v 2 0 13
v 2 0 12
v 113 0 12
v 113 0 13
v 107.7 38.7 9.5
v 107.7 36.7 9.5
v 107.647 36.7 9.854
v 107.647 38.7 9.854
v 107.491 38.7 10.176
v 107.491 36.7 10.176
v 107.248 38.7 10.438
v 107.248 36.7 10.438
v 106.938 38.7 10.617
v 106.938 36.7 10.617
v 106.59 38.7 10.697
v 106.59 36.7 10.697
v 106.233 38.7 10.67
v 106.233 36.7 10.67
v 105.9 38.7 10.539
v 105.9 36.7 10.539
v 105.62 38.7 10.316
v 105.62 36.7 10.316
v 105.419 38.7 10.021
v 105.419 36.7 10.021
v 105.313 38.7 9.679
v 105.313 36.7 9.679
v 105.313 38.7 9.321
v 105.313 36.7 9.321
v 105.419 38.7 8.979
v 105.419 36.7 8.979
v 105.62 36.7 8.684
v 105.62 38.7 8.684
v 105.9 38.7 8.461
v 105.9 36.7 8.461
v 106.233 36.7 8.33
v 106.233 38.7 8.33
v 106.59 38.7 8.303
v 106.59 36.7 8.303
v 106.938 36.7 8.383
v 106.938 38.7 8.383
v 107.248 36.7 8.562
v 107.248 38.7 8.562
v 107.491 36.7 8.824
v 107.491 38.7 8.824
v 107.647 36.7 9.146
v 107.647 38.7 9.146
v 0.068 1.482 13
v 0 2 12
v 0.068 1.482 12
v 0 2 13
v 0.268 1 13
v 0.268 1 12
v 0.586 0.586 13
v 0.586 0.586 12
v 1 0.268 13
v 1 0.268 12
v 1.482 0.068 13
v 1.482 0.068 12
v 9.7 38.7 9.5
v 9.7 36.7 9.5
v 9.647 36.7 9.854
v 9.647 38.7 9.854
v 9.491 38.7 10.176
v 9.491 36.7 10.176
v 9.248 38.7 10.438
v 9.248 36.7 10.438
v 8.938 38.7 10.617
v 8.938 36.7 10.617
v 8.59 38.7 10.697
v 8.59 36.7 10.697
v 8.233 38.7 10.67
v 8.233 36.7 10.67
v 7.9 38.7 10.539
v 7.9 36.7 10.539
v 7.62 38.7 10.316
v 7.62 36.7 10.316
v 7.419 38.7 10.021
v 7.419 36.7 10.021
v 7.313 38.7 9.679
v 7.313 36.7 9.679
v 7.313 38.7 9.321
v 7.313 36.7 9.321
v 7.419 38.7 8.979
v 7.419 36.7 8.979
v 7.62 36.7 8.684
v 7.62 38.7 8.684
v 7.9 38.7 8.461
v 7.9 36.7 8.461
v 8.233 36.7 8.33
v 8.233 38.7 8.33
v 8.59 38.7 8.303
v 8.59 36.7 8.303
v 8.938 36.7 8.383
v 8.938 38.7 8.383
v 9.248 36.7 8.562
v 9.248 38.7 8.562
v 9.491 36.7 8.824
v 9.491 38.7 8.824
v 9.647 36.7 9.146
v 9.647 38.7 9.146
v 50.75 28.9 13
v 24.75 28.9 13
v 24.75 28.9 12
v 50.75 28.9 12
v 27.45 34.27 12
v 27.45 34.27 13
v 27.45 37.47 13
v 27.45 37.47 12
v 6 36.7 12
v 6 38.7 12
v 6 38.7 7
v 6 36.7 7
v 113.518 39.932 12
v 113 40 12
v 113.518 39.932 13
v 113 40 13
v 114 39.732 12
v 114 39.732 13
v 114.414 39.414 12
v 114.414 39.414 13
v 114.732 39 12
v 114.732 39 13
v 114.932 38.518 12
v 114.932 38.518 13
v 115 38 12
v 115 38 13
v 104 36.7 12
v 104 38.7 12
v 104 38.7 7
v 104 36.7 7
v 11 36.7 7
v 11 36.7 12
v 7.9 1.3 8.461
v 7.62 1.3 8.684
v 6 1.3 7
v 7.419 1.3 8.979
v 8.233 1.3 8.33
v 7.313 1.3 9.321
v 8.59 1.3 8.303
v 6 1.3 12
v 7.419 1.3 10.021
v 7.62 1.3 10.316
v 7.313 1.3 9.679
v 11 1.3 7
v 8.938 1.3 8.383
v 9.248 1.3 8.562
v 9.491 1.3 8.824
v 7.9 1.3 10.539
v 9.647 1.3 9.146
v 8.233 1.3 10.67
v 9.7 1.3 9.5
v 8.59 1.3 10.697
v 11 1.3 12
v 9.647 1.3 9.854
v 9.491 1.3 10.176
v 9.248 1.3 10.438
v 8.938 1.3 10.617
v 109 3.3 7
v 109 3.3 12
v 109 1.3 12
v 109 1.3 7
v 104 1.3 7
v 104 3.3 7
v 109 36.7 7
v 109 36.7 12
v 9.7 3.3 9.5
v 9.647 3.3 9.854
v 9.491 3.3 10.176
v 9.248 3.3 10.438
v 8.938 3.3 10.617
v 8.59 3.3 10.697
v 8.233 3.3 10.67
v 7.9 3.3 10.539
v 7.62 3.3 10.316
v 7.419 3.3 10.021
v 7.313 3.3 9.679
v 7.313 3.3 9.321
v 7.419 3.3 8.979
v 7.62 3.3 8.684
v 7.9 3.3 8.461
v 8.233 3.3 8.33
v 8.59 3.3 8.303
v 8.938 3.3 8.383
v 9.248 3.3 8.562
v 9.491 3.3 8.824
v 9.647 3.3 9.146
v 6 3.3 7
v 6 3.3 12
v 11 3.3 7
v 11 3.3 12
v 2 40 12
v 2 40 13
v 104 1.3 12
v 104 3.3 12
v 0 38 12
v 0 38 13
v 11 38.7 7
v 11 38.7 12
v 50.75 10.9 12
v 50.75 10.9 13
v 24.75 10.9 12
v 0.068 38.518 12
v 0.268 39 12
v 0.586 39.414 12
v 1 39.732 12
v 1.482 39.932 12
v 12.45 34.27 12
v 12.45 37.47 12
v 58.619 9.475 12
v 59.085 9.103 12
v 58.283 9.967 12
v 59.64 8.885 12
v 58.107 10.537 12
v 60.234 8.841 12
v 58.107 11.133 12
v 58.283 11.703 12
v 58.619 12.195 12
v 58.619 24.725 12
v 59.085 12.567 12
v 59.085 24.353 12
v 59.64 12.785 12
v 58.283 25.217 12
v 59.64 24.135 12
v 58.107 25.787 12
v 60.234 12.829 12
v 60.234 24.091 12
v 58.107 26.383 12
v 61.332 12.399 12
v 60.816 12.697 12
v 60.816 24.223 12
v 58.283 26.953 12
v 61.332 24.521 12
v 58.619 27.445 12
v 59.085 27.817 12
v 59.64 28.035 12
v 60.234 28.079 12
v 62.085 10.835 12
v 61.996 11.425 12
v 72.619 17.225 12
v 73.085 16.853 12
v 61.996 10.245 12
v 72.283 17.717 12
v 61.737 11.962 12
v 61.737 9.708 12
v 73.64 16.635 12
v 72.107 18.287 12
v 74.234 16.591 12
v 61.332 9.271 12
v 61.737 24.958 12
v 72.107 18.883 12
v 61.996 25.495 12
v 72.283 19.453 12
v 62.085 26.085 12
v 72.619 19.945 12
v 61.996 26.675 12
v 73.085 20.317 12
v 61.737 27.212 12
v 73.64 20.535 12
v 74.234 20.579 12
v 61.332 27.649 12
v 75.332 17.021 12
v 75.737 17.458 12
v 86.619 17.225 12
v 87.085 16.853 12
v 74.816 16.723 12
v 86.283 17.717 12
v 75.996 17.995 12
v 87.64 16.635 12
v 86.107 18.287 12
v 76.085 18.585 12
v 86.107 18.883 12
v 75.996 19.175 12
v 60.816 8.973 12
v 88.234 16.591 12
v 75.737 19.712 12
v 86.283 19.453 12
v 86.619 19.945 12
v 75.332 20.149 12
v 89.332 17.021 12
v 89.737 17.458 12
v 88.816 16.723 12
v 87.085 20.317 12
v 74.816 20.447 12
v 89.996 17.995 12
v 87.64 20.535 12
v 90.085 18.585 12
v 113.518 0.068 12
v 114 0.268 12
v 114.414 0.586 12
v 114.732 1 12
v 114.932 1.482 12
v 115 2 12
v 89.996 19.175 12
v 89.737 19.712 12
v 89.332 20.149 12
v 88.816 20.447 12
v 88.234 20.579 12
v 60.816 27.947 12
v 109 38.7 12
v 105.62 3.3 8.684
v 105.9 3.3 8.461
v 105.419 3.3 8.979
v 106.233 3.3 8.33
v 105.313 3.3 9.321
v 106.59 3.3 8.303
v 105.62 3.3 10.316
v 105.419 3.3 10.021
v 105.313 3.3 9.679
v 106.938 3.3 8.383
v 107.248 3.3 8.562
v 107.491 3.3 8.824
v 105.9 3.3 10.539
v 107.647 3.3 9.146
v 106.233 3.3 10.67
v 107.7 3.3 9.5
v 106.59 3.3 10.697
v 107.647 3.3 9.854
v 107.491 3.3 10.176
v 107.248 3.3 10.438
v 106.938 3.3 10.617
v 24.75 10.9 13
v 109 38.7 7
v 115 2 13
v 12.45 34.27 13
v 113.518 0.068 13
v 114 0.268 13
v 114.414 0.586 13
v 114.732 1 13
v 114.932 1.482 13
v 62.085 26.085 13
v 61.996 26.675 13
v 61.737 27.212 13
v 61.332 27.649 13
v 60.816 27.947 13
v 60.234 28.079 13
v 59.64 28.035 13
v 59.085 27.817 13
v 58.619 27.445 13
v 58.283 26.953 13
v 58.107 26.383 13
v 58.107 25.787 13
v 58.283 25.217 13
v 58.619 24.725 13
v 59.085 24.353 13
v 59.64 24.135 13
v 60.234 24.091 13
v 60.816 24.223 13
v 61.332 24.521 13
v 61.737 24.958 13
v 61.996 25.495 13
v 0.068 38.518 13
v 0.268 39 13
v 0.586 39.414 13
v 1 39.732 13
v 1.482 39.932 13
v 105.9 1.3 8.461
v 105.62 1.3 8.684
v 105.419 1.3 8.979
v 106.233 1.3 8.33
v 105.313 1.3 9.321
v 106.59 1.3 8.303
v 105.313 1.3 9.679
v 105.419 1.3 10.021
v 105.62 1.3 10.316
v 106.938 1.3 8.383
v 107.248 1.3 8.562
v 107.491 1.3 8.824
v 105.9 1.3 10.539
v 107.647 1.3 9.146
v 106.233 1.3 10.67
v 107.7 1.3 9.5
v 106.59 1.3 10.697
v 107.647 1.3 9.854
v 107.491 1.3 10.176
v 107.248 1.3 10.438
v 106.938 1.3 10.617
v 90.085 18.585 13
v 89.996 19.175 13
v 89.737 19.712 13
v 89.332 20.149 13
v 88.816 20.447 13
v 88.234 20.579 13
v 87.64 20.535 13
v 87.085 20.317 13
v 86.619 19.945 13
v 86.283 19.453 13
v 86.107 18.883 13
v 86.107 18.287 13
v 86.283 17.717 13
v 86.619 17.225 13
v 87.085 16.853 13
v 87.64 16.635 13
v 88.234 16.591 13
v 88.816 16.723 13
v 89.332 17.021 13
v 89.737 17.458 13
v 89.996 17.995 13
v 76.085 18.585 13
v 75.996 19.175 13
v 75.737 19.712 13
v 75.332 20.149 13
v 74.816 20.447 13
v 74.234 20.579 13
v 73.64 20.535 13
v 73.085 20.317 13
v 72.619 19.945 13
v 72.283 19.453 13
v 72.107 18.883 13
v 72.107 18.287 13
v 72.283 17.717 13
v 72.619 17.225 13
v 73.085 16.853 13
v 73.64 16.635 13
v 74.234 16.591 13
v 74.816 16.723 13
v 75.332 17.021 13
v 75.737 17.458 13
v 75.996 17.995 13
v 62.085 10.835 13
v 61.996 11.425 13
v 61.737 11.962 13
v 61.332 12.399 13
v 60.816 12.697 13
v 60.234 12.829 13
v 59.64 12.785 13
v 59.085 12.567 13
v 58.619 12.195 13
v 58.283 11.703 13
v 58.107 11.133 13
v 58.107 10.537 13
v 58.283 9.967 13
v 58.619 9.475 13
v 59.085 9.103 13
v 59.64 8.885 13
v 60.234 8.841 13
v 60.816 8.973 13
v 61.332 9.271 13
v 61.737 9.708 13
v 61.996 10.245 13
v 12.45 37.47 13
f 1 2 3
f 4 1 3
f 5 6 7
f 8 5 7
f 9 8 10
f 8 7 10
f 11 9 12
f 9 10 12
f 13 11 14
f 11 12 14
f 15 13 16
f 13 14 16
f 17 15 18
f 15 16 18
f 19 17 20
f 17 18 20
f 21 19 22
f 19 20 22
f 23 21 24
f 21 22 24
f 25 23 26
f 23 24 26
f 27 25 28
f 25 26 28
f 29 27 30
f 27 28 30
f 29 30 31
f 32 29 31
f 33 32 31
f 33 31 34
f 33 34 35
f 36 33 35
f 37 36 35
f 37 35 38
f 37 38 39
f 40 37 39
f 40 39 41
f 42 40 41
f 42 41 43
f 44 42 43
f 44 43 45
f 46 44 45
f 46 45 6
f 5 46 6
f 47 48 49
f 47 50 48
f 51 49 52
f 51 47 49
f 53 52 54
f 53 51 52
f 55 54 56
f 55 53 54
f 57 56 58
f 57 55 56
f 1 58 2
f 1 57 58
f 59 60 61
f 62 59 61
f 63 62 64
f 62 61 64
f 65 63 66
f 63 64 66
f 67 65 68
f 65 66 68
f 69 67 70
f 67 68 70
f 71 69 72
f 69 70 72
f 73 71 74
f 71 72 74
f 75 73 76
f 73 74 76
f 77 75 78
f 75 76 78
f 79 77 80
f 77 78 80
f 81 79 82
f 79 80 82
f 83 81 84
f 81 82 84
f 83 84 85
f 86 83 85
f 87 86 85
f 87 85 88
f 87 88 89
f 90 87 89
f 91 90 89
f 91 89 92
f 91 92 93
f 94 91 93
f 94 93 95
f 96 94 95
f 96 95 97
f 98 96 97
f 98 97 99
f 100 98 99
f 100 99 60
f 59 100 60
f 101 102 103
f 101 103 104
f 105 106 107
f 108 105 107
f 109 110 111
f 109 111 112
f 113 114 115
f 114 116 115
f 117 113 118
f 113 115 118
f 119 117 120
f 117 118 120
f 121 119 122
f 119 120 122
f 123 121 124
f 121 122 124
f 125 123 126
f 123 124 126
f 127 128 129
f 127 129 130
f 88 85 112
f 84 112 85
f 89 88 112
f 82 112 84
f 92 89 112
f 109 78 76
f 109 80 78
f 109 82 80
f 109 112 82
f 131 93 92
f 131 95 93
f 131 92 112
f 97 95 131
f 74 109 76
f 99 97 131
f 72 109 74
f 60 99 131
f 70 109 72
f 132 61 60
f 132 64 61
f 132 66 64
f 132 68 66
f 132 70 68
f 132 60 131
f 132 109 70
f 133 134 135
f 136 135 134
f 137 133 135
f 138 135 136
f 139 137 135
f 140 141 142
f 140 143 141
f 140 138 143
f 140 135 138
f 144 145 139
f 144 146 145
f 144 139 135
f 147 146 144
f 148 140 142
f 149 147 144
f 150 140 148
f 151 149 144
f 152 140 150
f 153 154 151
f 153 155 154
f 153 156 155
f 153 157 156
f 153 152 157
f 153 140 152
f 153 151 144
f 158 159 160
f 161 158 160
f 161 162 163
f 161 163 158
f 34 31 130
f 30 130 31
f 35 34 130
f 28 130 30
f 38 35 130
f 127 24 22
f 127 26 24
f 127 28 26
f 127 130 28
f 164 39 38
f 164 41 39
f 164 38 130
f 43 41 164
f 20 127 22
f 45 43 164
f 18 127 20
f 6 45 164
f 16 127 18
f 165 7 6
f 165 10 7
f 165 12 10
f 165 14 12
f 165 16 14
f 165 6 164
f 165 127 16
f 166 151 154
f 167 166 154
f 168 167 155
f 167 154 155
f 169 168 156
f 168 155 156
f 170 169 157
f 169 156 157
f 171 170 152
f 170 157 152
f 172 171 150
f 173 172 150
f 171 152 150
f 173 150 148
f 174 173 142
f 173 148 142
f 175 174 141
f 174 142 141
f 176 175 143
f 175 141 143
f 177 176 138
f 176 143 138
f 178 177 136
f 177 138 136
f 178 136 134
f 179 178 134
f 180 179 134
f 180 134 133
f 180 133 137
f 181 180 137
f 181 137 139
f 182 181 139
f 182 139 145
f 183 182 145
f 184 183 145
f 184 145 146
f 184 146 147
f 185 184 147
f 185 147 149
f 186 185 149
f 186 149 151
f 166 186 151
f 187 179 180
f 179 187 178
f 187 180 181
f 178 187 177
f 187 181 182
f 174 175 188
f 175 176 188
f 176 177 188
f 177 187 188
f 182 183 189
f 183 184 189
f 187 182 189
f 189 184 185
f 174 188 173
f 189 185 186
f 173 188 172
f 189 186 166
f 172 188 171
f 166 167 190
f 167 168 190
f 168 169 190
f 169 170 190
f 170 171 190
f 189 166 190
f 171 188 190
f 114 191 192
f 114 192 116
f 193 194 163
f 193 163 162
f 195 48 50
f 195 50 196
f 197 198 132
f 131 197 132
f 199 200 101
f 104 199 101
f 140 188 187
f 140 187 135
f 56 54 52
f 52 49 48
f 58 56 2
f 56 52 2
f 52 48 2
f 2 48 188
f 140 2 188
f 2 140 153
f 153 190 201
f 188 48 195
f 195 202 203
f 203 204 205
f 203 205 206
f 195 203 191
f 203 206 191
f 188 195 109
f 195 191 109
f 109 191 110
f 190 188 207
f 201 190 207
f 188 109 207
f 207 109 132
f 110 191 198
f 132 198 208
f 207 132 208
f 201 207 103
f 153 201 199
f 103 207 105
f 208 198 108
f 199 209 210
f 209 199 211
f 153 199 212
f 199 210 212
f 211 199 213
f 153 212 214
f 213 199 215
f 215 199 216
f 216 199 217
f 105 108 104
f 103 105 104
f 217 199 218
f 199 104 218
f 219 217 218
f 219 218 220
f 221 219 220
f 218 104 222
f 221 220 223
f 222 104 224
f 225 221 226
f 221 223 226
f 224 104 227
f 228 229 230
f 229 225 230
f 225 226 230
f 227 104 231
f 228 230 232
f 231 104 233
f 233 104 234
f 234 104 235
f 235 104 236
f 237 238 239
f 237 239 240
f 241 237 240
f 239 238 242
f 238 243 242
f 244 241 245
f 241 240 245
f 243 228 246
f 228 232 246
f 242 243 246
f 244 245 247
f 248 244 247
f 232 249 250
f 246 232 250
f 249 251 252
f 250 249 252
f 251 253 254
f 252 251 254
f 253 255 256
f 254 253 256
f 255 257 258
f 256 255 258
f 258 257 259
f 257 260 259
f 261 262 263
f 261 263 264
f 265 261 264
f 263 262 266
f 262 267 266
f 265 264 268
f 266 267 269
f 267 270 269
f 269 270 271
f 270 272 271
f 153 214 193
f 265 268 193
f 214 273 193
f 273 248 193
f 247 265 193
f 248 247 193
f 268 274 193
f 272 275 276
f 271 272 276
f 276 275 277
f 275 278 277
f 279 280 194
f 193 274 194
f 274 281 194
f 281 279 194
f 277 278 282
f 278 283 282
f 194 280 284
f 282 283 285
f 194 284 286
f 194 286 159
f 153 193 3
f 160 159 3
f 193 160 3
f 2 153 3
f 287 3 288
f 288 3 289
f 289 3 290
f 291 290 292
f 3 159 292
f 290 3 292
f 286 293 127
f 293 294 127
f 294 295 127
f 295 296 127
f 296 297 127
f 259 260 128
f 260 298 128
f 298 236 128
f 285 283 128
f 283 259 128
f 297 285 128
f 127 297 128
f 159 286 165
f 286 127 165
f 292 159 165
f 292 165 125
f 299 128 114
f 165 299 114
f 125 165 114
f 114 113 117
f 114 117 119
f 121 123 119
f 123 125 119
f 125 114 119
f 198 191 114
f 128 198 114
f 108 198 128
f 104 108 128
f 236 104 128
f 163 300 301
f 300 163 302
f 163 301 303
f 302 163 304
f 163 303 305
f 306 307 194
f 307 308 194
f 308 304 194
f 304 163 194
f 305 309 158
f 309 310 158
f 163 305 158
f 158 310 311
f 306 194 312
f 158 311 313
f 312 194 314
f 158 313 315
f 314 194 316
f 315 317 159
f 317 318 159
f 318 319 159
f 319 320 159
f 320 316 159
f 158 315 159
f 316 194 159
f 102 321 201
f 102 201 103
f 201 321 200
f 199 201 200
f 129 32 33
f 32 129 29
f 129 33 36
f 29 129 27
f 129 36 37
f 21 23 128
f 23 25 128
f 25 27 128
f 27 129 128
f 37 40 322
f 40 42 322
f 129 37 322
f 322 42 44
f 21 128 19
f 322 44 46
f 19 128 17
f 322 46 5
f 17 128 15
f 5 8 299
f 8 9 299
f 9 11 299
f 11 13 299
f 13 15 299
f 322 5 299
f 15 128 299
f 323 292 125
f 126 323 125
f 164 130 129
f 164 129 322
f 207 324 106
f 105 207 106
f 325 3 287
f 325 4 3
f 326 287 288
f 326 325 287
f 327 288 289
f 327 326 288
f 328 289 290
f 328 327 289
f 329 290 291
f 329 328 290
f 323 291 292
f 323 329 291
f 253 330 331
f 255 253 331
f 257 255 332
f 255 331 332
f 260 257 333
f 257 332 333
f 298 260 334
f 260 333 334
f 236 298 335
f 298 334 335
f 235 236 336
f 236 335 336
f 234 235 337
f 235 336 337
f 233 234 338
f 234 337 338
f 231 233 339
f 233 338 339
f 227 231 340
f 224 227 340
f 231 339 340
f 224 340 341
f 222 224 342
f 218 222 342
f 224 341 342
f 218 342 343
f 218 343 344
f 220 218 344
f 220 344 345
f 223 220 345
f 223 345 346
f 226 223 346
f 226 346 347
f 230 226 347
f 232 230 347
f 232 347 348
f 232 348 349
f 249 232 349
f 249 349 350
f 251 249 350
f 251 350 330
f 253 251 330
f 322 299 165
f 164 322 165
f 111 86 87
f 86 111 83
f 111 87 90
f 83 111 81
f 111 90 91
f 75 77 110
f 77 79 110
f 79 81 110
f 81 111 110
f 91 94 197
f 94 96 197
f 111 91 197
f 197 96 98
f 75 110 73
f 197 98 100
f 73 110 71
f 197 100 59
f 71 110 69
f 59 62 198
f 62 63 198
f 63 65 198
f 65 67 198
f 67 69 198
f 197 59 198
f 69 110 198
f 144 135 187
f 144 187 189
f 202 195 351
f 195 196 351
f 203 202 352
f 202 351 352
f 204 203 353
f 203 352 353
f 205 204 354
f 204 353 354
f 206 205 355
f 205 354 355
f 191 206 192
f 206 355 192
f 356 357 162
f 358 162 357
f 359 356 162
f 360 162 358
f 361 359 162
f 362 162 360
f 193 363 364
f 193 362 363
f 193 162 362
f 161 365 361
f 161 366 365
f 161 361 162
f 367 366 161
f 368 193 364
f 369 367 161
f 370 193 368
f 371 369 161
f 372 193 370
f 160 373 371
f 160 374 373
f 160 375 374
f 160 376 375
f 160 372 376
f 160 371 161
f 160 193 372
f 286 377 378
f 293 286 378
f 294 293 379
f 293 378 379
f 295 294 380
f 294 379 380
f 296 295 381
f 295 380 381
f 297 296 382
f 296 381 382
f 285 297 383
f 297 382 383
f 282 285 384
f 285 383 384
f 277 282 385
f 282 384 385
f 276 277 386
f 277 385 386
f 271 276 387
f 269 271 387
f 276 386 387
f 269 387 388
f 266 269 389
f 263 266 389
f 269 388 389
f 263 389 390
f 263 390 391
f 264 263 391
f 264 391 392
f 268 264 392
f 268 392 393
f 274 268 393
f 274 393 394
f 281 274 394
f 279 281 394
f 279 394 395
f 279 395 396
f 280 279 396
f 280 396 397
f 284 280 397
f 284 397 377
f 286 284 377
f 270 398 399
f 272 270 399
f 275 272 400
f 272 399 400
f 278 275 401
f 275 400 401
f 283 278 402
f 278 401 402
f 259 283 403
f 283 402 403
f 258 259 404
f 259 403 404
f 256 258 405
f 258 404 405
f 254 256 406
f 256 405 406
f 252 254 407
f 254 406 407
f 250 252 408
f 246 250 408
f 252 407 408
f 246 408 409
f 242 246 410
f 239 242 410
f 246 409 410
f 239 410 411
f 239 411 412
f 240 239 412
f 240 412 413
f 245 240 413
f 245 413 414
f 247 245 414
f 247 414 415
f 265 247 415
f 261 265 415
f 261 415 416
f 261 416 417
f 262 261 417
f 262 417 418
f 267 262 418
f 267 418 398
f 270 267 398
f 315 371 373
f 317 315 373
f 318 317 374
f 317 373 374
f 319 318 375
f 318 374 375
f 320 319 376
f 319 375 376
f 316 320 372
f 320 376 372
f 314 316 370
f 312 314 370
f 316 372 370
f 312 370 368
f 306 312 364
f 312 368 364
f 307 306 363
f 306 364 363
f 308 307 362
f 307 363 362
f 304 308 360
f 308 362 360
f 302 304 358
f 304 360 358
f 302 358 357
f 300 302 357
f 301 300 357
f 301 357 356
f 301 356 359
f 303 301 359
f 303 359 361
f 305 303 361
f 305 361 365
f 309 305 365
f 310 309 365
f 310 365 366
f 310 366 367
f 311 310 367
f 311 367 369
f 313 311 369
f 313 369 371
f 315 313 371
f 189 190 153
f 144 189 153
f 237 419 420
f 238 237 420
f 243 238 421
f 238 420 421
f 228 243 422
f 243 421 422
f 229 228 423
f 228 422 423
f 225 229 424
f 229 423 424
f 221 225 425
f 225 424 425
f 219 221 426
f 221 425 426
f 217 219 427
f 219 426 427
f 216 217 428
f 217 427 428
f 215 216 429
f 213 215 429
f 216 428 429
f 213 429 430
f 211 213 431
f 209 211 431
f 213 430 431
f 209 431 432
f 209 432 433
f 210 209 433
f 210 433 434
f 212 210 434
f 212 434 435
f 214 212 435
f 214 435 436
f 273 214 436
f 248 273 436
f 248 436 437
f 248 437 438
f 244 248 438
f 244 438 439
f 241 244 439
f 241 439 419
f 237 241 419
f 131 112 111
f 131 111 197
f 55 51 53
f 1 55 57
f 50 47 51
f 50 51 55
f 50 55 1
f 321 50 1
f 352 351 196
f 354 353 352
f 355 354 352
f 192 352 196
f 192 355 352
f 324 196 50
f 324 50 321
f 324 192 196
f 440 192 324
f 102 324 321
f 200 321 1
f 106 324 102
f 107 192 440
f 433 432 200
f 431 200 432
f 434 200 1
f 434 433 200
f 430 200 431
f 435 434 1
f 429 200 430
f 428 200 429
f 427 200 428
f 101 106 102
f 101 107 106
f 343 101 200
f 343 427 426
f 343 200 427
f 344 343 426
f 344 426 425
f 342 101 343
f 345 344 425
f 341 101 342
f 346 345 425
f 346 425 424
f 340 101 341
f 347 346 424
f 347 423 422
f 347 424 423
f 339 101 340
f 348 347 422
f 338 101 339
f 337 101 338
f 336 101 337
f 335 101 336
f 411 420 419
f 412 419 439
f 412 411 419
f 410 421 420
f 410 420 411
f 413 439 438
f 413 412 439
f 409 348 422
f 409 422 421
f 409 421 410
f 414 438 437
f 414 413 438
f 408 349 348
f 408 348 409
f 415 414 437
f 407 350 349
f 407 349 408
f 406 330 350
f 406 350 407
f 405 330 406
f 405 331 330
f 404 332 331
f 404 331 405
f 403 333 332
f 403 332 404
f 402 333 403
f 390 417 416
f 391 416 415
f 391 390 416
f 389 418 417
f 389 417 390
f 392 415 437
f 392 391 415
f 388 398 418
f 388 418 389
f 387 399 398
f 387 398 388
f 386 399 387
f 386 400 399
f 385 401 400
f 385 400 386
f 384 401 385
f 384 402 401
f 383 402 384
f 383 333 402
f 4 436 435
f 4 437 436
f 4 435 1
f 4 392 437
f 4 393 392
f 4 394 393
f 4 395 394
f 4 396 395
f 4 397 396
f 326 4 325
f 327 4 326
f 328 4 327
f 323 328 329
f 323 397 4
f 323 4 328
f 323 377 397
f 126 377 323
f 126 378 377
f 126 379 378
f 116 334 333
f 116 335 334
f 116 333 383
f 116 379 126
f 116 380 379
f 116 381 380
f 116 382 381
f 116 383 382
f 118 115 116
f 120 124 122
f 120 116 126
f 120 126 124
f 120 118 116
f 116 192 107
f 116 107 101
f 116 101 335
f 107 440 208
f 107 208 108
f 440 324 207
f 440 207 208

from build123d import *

# Parameters (mm, degrees)
SKETCH005_W     = 115
SKETCH005_H     = 40
PAD002_DEPTH    = 1
SKETCH006_W     = 5
SKETCH006_H     = 2
PAD003_DEPTH    = 5
SKETCH007_R     = 2
POCKET002_DEPTH = 5
SKETCH008_W     = 26
SKETCH008_H     = 18
POCKET003_DEPTH = 5
SKETCH009_W     = 15
SKETCH009_H     = 3.2
POCKET004_DEPTH = 5
SKETCH010_R     = 1.2
POCKET005_DEPTH = 38.701
FILLET002_R     = 2


with BuildPart() as part:
    # Sketch005 → Pad002 (new body)
    with BuildSketch(Plane.XY):
        with Locations((57.5, 20)):
            Rectangle(SKETCH005_W, SKETCH005_H)
    extrude(amount=PAD002_DEPTH)

    # Sketch006 → Pad003 (join)
    with BuildSketch(Plane(origin=(0, 0, 0), x_dir=(1, 0, 0), z_dir=(0, 0, -1))):
        with Locations((8.5, -2.3)):
            Rectangle(SKETCH006_W, SKETCH006_H)
        with Locations((106.5, -2.3)):
            Rectangle(SKETCH006_W, SKETCH006_H)
        with Locations((106.5, -37.7)):
            Rectangle(SKETCH006_W, SKETCH006_H)
        with Locations((8.5, -37.7)):
            Rectangle(SKETCH006_W, SKETCH006_H)
    extrude(amount=PAD003_DEPTH)

    # Sketch007 (on Face5 of Pad003) → Pocket002 (cut)
    with BuildSketch(Plane.XY.offset(1)):
        with Locations((60.085, 10.835)):
            Circle(SKETCH007_R)
        with Locations((60.085, 26.085)):
            Circle(SKETCH007_R)
        with Locations((74.085, 18.585)):
            Circle(SKETCH007_R)
        with Locations((88.085, 18.585)):
            Circle(SKETCH007_R)
    extrude(amount=-POCKET002_DEPTH, mode=Mode.SUBTRACT)

    # Sketch008 (on Face5 of Pocket002) → Pocket003 (cut)
    with BuildSketch(Plane.XY.offset(1)):
        with Locations((37.75, 19.9)):
            Rectangle(SKETCH008_W, SKETCH008_H)
    extrude(amount=-POCKET003_DEPTH, mode=Mode.SUBTRACT)

    # Sketch009 (on Face5 of Pocket003) → Pocket004 (cut)
    with BuildSketch(Plane.XY.offset(1)):
        with Locations((19.95, 35.87)):
            Rectangle(SKETCH009_W, SKETCH009_H)
    extrude(amount=-POCKET004_DEPTH, mode=Mode.SUBTRACT)

    # Sketch010 (on Face7 of Pocket004) → Pocket005 (cut, through all)
    with BuildSketch(Plane.XZ.offset(-1.3)):
        with Locations((8.5, -2.5)):
            Circle(SKETCH010_R)
        with Locations((106.5, -2.5)):
            Circle(SKETCH010_R)
    extrude(amount=-POCKET005_DEPTH, mode=Mode.SUBTRACT)

    # Fillet002
    fillet002_edges = [part.edges().sort_by_distance(p)[0] for p in [
        (0, 0, 0.5),
        (115, 0, 0.5),
        (115, 40, 0.5),
        (0, 40, 0.5),
    ]]
    fillet(fillet002_edges, radius=FILLET002_R)


with BuildPart() as part_1:
    # Body001 placement: moved
    add(part.part.moved(Location((0, 0, 12))))


solid = part_1.part
